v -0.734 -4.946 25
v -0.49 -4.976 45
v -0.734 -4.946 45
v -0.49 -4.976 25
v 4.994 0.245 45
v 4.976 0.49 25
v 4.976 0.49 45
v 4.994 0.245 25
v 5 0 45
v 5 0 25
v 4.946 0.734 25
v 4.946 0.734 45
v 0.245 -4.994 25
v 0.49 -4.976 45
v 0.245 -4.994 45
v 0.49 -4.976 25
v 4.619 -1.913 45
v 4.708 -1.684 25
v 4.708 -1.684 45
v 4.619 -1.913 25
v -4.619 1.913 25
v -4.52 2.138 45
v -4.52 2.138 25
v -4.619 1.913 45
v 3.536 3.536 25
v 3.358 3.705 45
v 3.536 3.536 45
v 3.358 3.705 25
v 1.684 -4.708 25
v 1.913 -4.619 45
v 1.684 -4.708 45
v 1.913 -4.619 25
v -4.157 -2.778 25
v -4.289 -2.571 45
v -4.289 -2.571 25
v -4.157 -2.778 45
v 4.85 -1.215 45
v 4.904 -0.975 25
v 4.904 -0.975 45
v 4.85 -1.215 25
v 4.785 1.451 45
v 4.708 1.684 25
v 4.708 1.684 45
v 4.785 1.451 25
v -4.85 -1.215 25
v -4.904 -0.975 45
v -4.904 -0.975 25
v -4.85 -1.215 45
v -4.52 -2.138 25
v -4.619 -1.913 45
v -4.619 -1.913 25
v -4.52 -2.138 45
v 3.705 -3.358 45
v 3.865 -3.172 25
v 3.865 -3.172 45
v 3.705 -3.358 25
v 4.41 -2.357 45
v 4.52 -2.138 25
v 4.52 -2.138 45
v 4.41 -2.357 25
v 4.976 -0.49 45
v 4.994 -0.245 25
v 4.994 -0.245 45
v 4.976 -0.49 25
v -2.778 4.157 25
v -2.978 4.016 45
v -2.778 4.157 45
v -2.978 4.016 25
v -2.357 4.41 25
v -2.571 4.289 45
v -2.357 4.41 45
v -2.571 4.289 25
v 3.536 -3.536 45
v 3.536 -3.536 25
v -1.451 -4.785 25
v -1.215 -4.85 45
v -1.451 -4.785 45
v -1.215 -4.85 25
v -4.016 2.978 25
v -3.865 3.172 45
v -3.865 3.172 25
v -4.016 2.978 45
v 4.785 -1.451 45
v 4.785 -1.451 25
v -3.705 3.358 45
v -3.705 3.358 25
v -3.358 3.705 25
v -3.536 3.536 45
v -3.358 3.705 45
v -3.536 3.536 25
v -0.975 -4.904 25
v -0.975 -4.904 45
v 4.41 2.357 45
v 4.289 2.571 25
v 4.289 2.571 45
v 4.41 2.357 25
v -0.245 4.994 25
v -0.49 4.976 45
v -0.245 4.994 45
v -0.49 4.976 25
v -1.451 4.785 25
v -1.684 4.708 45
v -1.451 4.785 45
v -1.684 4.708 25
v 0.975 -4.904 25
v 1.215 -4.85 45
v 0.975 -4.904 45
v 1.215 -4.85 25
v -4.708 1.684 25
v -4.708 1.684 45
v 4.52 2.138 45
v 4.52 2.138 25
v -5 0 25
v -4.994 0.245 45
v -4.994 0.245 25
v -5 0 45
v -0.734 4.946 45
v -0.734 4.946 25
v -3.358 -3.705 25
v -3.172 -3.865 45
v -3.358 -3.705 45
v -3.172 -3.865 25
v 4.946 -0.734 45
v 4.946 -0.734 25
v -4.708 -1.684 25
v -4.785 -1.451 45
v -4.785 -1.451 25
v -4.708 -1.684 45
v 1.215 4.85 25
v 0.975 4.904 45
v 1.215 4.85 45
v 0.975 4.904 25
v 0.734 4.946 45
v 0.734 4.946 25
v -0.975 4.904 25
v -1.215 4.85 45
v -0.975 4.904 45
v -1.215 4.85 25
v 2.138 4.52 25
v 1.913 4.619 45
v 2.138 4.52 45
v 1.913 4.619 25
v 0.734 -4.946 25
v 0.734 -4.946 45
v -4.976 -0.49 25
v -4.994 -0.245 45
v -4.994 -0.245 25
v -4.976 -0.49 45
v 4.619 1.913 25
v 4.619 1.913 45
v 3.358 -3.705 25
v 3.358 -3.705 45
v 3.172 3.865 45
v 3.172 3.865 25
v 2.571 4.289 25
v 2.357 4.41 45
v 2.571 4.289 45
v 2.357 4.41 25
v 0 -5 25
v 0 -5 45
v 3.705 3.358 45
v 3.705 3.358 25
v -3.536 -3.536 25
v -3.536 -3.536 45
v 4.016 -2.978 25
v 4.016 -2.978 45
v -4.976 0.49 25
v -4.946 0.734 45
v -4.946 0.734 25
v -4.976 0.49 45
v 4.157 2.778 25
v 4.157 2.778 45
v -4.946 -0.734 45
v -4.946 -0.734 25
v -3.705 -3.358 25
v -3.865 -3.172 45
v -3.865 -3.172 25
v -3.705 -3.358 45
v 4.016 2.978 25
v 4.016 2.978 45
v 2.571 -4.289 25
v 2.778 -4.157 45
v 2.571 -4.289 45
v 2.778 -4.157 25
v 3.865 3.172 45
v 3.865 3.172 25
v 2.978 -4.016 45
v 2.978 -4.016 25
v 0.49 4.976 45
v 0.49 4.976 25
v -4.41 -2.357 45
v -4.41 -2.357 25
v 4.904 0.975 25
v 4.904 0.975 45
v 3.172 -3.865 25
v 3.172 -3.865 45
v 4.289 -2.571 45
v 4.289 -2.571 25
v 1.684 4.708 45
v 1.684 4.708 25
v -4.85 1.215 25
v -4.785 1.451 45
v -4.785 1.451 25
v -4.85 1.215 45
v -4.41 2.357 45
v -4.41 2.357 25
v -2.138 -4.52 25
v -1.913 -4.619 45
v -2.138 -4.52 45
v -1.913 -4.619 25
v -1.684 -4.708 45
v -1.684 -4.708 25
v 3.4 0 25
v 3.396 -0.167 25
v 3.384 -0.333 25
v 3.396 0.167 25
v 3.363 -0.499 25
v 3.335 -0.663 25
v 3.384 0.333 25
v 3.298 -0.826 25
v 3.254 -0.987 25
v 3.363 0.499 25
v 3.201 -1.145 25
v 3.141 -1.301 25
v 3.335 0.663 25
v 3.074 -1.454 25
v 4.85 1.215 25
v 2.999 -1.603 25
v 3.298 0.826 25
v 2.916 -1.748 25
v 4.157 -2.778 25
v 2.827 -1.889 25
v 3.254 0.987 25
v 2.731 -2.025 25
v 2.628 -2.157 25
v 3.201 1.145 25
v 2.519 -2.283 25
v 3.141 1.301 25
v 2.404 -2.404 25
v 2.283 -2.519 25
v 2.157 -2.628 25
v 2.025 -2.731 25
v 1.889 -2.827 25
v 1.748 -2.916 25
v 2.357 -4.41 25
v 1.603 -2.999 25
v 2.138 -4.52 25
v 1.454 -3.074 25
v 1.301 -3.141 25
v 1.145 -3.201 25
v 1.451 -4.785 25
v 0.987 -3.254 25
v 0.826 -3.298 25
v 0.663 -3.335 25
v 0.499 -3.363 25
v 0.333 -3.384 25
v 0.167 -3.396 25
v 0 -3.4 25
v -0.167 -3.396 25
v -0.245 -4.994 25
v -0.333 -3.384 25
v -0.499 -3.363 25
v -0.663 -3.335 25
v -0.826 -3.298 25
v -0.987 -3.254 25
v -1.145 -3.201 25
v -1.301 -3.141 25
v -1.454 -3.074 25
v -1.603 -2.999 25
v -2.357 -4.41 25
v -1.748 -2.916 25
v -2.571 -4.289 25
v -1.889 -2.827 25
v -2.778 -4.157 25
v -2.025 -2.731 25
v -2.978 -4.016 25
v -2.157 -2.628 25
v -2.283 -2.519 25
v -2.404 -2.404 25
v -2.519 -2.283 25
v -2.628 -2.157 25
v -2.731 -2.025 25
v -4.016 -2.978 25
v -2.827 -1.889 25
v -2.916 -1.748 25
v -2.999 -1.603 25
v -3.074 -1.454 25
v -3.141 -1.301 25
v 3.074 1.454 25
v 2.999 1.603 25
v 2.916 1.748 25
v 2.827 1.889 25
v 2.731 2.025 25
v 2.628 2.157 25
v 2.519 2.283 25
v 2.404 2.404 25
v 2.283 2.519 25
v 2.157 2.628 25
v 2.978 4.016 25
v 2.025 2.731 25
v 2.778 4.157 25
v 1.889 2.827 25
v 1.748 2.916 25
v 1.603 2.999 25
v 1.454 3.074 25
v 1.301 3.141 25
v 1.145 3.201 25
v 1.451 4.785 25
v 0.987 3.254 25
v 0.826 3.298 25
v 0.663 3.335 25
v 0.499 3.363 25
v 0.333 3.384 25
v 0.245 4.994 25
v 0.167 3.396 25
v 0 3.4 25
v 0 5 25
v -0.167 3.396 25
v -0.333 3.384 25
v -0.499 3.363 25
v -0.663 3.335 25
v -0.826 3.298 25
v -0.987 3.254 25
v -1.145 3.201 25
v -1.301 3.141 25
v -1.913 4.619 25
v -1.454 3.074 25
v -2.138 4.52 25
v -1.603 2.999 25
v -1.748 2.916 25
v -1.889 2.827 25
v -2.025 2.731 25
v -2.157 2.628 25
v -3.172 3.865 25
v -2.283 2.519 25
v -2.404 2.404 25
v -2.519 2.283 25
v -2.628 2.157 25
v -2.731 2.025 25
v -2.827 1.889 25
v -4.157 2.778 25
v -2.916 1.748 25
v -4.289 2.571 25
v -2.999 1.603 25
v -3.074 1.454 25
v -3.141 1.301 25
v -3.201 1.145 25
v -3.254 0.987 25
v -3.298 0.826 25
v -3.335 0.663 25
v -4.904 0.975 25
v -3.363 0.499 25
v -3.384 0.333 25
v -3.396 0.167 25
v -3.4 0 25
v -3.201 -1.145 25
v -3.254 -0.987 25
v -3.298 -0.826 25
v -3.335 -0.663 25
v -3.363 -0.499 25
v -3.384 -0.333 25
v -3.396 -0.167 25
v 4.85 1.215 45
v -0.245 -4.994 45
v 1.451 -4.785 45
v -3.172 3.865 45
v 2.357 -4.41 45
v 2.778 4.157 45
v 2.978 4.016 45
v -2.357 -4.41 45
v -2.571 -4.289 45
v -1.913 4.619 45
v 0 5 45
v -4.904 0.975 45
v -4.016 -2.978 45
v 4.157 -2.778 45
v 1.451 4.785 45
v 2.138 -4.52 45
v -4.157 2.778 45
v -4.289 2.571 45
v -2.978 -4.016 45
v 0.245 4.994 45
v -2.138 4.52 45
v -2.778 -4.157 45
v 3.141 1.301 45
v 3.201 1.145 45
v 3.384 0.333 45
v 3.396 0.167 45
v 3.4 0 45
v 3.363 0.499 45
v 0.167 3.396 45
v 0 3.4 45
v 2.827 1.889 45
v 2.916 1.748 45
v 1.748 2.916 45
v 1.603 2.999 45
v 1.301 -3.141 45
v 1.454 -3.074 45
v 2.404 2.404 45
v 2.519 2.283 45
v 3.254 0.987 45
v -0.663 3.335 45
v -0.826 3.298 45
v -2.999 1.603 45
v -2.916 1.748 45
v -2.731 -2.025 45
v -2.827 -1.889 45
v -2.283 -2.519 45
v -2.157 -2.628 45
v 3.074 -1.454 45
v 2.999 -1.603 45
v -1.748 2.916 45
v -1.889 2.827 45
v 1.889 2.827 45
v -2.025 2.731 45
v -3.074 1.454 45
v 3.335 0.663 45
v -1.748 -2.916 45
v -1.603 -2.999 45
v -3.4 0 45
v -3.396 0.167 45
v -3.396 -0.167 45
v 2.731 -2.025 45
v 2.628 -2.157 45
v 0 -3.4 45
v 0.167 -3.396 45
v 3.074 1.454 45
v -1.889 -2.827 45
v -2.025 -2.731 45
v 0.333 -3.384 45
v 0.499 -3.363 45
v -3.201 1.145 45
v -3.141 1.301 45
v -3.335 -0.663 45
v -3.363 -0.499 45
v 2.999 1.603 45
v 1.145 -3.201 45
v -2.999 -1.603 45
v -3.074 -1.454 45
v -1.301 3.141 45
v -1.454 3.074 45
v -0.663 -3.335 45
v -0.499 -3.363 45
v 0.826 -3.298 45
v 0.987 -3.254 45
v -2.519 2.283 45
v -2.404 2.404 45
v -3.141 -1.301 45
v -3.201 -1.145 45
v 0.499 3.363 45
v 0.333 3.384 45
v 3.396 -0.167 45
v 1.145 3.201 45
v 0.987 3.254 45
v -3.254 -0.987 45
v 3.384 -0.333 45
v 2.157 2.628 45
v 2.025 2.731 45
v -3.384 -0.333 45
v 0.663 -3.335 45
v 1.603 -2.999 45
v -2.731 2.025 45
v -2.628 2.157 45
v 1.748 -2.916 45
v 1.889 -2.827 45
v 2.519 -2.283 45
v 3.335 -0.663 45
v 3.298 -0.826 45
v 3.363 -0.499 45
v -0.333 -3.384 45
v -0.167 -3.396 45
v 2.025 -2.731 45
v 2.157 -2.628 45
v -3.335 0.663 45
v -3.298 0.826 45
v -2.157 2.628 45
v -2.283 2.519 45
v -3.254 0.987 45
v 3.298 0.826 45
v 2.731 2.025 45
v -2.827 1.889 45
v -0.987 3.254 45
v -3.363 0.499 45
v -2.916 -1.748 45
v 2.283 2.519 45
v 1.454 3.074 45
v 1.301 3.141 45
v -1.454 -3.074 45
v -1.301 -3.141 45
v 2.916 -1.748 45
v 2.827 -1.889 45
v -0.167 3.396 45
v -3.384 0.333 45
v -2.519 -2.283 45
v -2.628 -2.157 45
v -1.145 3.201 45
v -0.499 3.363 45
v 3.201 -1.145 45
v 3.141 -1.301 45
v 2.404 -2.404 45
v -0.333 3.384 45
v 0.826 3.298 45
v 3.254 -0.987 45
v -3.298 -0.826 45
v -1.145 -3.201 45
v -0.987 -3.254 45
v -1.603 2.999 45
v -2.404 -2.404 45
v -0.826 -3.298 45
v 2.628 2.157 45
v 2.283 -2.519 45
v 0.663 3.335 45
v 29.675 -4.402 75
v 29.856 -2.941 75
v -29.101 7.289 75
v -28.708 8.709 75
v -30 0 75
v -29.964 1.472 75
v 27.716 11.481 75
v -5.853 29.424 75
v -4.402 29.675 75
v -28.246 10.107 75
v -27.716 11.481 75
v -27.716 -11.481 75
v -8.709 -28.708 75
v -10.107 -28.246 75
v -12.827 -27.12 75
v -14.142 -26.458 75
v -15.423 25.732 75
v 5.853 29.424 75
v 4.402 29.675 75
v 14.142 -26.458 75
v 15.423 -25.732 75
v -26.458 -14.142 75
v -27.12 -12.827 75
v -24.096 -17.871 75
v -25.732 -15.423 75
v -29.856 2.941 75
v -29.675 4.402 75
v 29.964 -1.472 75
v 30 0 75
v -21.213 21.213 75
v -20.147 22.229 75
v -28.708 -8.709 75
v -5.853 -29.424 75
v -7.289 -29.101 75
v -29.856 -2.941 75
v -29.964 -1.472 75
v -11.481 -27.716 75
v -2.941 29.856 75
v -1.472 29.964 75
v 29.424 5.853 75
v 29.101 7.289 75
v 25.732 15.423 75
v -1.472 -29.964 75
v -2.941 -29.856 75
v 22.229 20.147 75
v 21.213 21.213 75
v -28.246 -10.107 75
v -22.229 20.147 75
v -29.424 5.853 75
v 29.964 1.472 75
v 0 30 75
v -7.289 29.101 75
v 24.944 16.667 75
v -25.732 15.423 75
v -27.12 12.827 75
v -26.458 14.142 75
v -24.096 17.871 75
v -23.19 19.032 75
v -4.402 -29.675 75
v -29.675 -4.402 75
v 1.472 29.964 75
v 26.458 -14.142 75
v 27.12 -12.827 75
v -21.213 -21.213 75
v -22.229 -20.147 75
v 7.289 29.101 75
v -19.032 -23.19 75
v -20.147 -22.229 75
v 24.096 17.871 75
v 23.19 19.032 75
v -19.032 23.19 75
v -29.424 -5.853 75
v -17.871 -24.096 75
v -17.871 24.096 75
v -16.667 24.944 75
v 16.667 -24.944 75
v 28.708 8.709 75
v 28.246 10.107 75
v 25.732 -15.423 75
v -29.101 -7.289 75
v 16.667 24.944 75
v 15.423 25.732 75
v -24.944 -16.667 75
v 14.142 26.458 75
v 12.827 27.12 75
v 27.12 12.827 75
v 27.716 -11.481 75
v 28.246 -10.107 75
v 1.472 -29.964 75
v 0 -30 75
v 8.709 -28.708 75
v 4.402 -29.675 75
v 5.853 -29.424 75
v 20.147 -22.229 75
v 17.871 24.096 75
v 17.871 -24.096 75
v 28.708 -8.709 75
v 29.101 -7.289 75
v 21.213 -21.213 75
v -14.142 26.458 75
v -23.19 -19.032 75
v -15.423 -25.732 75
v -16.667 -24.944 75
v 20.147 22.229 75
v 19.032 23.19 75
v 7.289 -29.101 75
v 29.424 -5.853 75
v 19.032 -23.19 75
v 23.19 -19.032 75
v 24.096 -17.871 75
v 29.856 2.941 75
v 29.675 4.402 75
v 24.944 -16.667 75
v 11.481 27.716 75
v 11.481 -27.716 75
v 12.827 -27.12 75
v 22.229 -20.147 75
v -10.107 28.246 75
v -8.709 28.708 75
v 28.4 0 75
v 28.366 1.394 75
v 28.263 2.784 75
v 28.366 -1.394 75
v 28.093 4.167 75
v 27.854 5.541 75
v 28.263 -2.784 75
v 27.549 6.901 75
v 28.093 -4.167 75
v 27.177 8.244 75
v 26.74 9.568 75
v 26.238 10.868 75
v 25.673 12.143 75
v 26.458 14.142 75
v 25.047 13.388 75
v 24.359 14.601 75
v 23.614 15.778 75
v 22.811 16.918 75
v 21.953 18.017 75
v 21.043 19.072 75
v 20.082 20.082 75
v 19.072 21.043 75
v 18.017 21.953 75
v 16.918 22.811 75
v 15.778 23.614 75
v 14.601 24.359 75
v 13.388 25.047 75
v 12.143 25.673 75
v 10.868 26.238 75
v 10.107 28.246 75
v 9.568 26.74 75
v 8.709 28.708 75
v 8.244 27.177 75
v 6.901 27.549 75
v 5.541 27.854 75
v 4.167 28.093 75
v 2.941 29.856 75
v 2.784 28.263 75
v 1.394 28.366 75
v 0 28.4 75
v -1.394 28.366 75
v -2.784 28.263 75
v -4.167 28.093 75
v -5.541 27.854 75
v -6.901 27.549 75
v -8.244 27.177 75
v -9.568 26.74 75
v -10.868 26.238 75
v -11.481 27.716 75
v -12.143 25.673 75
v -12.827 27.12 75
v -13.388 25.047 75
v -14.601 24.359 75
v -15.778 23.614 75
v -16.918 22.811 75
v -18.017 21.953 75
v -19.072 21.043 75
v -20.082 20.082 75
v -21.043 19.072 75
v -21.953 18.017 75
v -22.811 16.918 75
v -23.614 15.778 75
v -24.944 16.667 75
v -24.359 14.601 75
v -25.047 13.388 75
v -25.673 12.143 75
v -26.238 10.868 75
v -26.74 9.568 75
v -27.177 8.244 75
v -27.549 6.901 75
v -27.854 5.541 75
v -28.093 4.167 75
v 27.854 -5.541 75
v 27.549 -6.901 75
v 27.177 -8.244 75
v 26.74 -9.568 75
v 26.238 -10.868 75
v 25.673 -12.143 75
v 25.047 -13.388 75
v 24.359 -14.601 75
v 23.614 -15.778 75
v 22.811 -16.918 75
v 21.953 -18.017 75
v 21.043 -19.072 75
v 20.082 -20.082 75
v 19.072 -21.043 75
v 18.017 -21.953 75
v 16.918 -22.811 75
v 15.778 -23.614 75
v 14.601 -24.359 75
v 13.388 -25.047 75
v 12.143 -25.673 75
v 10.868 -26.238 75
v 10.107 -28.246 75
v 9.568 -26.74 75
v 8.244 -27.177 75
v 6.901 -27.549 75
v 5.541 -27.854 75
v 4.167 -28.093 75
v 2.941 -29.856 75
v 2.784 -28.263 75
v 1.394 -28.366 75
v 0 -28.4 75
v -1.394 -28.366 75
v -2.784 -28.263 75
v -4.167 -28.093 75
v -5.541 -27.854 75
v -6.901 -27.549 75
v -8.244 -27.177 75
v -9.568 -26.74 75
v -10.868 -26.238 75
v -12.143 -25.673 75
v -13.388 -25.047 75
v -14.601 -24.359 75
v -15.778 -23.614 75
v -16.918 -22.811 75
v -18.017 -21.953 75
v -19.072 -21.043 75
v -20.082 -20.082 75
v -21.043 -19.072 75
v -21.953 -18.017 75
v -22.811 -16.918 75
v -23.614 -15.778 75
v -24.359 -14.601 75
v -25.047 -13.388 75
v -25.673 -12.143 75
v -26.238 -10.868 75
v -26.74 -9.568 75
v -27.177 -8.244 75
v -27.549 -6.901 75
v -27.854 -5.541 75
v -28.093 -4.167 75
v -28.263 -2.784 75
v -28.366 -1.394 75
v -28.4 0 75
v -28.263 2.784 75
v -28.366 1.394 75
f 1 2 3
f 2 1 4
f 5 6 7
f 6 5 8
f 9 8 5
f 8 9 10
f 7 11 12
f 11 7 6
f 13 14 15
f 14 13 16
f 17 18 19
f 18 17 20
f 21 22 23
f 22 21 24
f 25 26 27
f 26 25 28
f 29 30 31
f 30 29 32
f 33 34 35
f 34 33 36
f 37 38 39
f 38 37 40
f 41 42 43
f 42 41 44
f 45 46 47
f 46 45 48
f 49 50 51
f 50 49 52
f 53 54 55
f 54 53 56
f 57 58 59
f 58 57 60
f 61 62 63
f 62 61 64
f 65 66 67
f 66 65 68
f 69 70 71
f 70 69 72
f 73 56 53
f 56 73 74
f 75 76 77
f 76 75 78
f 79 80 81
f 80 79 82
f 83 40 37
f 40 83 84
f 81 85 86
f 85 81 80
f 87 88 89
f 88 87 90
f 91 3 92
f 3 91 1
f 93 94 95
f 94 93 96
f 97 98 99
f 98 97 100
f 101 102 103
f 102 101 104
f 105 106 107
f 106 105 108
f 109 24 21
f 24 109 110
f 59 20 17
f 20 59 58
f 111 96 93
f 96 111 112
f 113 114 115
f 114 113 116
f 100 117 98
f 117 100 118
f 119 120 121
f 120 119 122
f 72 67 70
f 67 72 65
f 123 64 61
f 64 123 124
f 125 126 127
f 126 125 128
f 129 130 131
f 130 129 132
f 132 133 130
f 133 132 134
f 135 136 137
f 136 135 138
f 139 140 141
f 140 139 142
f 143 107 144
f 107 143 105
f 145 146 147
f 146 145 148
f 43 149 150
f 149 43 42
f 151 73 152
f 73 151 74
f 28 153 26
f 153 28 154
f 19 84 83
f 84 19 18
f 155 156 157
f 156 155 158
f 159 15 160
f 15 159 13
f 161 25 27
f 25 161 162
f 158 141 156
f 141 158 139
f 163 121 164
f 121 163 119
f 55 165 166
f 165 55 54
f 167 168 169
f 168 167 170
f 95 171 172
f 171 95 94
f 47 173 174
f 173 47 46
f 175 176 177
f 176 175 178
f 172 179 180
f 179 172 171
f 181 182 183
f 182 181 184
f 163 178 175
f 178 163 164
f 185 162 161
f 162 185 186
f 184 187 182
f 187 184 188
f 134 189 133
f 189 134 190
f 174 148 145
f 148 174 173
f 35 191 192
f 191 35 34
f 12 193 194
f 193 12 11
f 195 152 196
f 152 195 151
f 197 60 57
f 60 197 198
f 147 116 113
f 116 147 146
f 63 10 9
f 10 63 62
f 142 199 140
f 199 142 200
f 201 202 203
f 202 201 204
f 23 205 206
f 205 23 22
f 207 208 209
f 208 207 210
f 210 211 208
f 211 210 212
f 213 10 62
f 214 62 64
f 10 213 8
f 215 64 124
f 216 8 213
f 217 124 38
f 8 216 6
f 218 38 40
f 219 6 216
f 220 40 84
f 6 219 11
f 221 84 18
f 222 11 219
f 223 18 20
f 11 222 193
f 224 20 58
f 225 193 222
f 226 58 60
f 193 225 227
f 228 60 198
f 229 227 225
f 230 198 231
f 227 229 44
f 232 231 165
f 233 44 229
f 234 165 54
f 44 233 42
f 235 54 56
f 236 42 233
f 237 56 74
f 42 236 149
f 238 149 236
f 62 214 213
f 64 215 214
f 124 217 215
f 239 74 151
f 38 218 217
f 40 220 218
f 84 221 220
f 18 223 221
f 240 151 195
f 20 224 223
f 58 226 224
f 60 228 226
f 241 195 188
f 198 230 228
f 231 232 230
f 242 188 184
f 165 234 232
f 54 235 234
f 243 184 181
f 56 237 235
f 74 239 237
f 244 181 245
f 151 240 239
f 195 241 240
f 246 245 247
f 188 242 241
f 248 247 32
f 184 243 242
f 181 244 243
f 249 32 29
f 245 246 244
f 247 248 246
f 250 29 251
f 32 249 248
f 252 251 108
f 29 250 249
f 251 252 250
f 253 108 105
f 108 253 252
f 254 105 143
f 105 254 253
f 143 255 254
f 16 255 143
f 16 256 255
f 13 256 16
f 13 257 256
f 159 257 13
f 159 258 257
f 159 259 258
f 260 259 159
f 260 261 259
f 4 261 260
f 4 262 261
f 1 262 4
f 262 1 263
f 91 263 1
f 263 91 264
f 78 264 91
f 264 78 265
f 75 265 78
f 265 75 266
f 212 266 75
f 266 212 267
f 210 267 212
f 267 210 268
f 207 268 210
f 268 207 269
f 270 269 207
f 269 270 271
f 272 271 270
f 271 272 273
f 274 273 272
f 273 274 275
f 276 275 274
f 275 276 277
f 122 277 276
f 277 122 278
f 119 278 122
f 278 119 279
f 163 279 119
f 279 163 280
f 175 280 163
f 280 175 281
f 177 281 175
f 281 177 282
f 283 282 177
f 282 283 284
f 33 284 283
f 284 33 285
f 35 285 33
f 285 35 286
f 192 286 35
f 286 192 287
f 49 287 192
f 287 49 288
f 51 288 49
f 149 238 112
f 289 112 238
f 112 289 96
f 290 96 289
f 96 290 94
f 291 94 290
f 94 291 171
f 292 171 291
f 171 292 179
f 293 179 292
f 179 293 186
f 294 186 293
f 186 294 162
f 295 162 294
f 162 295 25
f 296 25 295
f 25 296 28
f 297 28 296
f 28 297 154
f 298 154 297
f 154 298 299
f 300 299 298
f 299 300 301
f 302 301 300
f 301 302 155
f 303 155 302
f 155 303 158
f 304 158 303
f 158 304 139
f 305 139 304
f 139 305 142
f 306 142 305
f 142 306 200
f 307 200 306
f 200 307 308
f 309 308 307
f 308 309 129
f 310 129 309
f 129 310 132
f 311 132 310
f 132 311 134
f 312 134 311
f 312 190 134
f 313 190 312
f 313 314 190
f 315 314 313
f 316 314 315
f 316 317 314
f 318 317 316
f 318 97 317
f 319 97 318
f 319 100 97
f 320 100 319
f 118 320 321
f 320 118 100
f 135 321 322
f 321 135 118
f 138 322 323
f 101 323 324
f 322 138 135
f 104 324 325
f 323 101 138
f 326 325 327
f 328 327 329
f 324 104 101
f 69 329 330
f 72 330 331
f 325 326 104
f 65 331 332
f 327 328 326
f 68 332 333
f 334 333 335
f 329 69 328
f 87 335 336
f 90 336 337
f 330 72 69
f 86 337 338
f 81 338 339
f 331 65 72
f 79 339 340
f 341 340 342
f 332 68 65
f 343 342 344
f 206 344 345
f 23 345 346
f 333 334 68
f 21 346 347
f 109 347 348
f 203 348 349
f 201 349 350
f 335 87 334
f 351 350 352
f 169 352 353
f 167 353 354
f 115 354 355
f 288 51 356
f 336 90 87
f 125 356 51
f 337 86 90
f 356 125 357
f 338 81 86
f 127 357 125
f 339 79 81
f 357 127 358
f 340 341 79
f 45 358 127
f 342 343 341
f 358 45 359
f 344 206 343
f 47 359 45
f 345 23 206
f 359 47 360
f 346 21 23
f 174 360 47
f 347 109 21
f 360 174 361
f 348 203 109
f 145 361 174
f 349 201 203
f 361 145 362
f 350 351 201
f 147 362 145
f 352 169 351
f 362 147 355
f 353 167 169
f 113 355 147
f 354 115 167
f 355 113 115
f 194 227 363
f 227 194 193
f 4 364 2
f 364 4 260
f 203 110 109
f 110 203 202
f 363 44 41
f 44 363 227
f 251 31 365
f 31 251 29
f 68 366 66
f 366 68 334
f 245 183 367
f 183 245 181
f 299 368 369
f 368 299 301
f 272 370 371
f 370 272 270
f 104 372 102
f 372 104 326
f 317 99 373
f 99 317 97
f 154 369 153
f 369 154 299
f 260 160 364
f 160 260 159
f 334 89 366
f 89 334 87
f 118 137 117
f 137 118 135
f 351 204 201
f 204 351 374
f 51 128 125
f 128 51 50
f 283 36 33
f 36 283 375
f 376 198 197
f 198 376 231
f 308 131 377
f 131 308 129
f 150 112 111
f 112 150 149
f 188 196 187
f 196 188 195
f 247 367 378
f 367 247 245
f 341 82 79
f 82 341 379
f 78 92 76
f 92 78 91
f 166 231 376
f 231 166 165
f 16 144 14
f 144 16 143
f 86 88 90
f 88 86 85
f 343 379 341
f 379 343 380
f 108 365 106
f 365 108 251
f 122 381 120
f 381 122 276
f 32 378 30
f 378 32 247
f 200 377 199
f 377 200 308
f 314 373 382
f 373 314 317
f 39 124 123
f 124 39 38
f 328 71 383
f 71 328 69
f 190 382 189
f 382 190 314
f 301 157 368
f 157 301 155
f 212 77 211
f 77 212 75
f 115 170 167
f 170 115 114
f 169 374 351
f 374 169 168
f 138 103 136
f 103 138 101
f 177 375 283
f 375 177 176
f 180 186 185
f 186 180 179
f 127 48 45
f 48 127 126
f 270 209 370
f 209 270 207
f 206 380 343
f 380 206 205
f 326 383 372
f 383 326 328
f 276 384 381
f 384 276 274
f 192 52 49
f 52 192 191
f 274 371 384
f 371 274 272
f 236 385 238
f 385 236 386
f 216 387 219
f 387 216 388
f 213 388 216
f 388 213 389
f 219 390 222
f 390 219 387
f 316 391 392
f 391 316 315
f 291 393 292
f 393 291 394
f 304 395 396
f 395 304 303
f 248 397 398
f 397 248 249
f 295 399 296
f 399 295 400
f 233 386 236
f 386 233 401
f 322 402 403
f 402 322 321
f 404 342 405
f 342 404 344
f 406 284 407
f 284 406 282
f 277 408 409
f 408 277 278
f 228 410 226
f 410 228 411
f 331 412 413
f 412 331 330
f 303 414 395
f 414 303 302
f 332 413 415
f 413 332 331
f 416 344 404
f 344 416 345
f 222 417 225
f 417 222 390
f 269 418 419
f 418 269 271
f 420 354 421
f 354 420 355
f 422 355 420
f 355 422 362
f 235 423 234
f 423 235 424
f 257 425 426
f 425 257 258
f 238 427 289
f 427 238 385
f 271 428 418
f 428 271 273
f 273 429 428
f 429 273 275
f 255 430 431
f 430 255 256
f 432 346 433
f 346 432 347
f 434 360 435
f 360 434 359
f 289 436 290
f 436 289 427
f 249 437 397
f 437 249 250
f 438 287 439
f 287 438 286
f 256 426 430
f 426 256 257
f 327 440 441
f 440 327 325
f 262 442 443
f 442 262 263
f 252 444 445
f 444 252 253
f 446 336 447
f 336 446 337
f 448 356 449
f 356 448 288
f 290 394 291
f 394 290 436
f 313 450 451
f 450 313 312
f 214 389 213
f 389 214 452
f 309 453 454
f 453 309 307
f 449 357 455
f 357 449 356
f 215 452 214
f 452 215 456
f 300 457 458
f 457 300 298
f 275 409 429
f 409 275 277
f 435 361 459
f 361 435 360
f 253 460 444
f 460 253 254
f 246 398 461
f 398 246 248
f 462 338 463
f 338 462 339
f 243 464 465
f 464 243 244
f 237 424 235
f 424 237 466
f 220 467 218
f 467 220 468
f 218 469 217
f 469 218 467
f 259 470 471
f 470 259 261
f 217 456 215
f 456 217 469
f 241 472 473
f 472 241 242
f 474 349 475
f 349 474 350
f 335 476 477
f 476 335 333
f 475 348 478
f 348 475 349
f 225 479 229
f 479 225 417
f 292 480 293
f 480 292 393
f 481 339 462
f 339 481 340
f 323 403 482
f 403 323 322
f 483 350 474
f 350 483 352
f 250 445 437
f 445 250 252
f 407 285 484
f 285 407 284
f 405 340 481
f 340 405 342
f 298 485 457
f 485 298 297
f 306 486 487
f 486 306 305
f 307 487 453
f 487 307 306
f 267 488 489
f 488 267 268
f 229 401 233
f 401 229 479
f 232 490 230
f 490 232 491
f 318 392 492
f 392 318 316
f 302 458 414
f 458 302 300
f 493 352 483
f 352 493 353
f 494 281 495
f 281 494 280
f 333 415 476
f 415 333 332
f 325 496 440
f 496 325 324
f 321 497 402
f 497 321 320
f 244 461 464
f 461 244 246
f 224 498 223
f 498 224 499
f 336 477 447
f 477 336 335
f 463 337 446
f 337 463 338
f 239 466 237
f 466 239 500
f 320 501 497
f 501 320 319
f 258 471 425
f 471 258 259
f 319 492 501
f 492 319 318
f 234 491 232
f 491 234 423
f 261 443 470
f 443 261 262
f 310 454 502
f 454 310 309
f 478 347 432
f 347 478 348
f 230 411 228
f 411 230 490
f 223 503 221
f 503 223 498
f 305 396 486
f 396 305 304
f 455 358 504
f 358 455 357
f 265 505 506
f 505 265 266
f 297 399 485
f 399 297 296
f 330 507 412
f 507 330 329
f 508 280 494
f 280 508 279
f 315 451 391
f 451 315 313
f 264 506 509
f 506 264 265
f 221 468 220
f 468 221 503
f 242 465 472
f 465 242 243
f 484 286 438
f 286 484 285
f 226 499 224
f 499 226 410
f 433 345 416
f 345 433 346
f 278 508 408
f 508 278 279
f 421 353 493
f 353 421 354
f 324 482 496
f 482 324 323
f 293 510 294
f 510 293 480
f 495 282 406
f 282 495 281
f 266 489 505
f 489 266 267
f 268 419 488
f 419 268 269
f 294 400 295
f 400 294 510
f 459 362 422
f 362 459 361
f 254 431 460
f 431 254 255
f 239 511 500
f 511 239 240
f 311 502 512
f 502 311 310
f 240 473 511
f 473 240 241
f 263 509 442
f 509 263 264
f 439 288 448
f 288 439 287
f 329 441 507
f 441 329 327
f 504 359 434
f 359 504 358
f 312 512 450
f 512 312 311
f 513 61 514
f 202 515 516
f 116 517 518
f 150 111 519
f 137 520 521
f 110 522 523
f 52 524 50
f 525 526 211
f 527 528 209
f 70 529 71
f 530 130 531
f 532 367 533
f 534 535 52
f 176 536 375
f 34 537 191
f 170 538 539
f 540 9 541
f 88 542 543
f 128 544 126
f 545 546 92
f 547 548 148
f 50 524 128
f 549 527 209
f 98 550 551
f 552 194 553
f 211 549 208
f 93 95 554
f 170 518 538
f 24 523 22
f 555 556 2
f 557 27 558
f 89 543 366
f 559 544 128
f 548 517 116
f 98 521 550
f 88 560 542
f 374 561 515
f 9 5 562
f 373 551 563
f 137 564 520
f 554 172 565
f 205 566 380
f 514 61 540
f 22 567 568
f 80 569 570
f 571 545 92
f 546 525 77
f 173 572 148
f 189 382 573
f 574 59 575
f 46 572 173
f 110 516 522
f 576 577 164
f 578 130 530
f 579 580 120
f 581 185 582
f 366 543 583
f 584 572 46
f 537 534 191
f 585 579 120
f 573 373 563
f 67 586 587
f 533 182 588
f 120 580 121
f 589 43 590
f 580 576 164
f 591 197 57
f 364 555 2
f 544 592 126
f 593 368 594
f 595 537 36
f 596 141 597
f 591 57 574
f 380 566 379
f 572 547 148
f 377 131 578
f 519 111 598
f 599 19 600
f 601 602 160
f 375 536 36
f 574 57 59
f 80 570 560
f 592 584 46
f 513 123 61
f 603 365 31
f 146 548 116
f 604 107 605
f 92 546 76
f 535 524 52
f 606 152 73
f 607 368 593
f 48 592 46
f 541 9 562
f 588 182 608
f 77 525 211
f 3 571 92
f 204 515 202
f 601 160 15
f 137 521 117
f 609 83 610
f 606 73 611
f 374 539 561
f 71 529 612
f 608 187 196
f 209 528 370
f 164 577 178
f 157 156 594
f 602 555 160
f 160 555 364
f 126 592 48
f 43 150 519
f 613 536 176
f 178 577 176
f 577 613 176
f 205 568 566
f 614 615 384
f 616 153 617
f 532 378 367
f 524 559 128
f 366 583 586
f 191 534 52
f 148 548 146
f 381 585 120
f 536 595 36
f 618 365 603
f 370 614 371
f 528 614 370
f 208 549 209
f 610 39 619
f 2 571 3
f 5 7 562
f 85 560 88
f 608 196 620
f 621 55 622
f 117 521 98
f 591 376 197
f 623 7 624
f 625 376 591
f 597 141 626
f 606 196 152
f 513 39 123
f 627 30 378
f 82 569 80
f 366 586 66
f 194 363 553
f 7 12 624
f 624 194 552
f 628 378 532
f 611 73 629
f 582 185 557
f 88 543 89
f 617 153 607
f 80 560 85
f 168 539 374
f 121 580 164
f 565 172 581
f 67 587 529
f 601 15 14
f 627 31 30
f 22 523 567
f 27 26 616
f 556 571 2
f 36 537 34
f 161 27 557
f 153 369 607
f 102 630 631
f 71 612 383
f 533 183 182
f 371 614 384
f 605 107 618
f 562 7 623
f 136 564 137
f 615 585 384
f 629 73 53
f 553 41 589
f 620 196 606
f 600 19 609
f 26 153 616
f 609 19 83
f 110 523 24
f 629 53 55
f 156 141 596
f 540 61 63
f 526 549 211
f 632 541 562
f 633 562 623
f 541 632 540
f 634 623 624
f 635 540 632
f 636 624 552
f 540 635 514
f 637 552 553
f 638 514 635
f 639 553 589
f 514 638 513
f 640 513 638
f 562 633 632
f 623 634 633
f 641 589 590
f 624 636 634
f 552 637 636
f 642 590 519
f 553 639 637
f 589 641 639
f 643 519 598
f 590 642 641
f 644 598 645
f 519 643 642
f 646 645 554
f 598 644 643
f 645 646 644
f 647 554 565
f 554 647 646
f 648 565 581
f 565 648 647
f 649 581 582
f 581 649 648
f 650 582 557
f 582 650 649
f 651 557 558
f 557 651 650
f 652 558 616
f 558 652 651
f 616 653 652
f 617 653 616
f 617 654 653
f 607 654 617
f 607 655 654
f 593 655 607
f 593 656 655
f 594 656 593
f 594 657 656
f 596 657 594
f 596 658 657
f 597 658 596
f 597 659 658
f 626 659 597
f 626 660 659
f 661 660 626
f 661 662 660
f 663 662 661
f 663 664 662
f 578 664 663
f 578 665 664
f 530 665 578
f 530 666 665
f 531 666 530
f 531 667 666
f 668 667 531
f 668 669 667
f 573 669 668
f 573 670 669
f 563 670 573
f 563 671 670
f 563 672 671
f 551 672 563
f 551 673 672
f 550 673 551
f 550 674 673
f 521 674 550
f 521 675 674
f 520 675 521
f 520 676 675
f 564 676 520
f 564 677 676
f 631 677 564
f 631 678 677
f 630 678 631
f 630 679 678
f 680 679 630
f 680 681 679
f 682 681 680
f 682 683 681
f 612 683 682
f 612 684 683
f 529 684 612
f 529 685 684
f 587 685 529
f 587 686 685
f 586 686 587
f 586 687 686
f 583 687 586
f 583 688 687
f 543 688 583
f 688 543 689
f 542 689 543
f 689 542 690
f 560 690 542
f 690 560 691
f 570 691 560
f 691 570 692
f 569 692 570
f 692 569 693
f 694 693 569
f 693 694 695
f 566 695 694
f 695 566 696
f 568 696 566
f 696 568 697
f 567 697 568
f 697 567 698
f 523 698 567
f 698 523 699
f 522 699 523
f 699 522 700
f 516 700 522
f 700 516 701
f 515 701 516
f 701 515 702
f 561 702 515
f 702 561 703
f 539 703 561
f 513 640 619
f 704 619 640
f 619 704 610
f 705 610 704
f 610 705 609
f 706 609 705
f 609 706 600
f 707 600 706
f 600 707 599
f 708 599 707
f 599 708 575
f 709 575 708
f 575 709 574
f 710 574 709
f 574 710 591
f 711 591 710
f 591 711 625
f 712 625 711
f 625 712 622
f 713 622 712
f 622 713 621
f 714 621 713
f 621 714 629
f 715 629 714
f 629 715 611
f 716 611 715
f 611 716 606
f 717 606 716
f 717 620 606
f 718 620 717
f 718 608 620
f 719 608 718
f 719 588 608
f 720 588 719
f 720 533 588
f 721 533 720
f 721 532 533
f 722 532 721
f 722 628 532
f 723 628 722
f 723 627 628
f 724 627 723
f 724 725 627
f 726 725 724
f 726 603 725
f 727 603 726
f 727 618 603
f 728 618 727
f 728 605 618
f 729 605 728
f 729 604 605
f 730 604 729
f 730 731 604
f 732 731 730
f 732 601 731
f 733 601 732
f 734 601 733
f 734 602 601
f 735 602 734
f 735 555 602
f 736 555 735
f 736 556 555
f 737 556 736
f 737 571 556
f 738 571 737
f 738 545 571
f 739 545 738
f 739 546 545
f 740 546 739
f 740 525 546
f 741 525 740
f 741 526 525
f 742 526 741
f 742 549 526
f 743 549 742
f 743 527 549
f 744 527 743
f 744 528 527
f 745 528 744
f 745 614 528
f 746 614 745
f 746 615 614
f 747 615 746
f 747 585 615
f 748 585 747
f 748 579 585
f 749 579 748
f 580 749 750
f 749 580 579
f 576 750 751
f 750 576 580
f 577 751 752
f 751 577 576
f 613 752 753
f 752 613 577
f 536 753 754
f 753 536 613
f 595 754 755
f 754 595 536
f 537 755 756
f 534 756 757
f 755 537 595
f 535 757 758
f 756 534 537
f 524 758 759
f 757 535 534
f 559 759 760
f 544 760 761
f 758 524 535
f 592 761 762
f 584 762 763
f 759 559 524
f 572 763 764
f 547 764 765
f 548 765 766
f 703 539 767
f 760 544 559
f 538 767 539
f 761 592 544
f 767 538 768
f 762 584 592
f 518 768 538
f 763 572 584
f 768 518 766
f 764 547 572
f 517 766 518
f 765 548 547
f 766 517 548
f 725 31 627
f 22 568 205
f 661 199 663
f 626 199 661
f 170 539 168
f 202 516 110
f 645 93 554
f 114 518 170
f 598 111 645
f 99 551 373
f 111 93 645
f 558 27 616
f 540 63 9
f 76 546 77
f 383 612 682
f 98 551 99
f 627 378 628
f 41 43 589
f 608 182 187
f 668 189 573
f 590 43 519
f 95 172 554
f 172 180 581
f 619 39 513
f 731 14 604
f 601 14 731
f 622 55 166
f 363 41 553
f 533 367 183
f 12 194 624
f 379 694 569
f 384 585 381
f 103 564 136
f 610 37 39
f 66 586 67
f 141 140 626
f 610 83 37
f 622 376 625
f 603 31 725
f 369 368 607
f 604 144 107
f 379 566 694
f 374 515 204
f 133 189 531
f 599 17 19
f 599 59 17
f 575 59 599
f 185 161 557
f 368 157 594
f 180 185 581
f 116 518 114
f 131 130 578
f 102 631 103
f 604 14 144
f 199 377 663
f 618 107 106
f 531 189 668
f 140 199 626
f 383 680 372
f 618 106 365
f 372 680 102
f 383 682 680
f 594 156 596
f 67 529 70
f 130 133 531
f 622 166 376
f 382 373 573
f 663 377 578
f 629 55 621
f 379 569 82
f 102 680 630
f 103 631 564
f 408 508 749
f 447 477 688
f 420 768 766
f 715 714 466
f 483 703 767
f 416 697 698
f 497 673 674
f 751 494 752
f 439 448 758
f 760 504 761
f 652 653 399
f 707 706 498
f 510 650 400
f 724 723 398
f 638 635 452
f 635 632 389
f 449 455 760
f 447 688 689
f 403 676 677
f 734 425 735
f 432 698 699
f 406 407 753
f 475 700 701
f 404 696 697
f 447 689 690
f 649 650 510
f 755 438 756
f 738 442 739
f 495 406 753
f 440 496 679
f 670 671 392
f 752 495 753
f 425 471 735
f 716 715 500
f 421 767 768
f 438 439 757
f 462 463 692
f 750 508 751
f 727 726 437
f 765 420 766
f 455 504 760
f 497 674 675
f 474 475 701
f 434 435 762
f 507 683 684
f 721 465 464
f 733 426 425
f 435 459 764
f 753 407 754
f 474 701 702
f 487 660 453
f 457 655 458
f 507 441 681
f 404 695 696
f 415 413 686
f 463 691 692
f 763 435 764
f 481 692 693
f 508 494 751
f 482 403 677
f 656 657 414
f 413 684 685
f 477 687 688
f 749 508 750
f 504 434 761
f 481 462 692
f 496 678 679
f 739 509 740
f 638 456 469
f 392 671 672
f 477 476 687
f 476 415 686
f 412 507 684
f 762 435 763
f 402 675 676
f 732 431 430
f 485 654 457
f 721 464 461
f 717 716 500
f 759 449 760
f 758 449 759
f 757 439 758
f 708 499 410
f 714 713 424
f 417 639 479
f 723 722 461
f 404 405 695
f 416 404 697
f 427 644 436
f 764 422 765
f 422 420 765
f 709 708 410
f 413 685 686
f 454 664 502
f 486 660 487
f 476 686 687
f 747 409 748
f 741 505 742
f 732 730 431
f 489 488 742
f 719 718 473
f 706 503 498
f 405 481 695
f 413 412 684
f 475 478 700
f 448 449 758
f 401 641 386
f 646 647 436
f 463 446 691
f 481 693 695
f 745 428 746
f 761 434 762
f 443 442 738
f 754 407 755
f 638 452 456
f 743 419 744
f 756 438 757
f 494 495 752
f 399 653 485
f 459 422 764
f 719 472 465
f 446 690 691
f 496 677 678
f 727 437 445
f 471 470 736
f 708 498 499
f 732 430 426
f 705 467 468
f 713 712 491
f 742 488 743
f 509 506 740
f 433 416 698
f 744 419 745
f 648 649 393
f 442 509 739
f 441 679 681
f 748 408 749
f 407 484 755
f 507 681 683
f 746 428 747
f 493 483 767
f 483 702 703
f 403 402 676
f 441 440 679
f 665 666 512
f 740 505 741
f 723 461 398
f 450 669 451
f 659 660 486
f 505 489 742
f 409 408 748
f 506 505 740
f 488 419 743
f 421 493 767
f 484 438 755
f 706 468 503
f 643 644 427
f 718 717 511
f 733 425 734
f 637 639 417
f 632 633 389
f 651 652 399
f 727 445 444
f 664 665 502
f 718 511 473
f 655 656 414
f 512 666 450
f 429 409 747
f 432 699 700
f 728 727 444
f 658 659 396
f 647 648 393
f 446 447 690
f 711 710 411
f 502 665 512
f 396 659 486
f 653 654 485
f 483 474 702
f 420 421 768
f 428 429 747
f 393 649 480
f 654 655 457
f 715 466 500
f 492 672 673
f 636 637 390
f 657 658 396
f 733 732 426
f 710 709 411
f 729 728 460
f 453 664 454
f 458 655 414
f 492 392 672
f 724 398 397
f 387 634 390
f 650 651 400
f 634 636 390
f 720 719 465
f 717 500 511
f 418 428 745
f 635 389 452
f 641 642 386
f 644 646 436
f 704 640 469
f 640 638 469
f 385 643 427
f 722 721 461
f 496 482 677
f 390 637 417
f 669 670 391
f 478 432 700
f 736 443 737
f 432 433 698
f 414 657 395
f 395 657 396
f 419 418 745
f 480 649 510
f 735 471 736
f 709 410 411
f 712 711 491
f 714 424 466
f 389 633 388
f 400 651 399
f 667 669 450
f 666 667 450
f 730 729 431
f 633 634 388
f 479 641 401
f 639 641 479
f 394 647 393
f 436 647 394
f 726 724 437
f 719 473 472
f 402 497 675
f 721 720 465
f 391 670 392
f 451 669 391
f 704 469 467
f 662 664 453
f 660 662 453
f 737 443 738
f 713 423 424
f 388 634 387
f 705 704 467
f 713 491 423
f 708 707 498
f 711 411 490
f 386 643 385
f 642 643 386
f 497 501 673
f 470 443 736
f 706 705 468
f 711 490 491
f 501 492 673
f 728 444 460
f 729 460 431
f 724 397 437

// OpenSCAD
$fn = 128; // High resolution for smooth curves

// --- Dimensions (mm) ---
// Spout dimensions
$spout_outer_d = 10;
$spout_inner_d = 6.8; // 10 - 2*1.6
$spout_height = 20;

// Cone dimensions
$cone_bottom_d = 10; // Matches spout outer diameter
$cone_top_d = 60;
$cone_height = 30;   // From z=20 to z=50

// Wall thickness
$wall_thickness = 1.6;

// Derived dimensions
$part_total_height = $spout_height + $cone_height; // 50mm
$part_radius_outer = $spout_outer_d / 2;
$part_radius_inner = $spout_inner_d / 2;

// --- Construction ---

// Module to create a hollow cylinder (spout)
module hollow_cylinder(outer_d, inner_d, h) {
    difference() {
        cylinder(h = h, r = outer_d / 2, center = [0, 0, h/2]);
        cylinder(h = h, r = inner_d / 2, center = [0, 0, h/2]);
    }
}

// Module to create the conical funnel using rotate_extrude
// Profile is defined in X-Z plane: [x, z] points
module hollow_cone(outer_bottom_d, outer_top_d, inner_bottom_d, inner_top_d, h) {
    // Calculate inner top diameter based on wall thickness
    // inner_top_d = outer_top_d - 2*wall_thickness
    // We pass calculated values to ensure precision
    
    difference() {
        // Outer Cone
        // Profile: Bottom at z=0 (radius = outer_bottom_d/2), Top at z=h (radius = outer_top_d/2)
        // We use rotate_extrude around Z axis. The profile is in the X-Z plane.
        // Points: [x, z]
        // Start at bottom center: [0, 0] -> [outer_bottom_d/2, 0] -> [outer_top_d/2, h] -> [0, h] -> close
        rotate_extrude() {
            polygon(points = [
                [0, 0],
                [outer_bottom_d / 2, 0],
                [outer_top_d / 2, h],
                [0, h]
            ], convexity = 3);
        }
        
        // Inner Cone (Hole)
        // Profile: Bottom at z=0 (radius = inner_bottom_d/2), Top at z=h (radius = inner_top_d/2)
        rotate_extrude() {
            polygon(points = [
                [0, 0],
                [inner_bottom_d / 2, 0],
                [inner_top_d / 2, h],
                [0, h]
            ], convexity = 3);
        }
    }
}

// --- Main Assembly ---
// The part is built upright. 
// Spout is from z=0 to z=20.
// Cone is from z=20 to z=50.
// We center the whole assembly on the origin for symmetry.

translate([0, 0, $part_total_height / 2]) {
    union() {
        // 1. Spout (Bottom part)
        hollow_cylinder($spout_outer_d, $spout_inner_d, $spout_height);
        
        // 2. Cone (Top part)
        // Translate up by spout height to connect
        translate([0, 0, $spout_height]) {
            hollow_cone(
                $cone_bottom_d, 
                $cone_top_d, 
                $spout_inner_d, // Inner bottom matches spout inner
                ($cone_top_d - (2 * $wall_thickness)), // Inner top calculated
                $cone_height
            );
        }
    }
}
